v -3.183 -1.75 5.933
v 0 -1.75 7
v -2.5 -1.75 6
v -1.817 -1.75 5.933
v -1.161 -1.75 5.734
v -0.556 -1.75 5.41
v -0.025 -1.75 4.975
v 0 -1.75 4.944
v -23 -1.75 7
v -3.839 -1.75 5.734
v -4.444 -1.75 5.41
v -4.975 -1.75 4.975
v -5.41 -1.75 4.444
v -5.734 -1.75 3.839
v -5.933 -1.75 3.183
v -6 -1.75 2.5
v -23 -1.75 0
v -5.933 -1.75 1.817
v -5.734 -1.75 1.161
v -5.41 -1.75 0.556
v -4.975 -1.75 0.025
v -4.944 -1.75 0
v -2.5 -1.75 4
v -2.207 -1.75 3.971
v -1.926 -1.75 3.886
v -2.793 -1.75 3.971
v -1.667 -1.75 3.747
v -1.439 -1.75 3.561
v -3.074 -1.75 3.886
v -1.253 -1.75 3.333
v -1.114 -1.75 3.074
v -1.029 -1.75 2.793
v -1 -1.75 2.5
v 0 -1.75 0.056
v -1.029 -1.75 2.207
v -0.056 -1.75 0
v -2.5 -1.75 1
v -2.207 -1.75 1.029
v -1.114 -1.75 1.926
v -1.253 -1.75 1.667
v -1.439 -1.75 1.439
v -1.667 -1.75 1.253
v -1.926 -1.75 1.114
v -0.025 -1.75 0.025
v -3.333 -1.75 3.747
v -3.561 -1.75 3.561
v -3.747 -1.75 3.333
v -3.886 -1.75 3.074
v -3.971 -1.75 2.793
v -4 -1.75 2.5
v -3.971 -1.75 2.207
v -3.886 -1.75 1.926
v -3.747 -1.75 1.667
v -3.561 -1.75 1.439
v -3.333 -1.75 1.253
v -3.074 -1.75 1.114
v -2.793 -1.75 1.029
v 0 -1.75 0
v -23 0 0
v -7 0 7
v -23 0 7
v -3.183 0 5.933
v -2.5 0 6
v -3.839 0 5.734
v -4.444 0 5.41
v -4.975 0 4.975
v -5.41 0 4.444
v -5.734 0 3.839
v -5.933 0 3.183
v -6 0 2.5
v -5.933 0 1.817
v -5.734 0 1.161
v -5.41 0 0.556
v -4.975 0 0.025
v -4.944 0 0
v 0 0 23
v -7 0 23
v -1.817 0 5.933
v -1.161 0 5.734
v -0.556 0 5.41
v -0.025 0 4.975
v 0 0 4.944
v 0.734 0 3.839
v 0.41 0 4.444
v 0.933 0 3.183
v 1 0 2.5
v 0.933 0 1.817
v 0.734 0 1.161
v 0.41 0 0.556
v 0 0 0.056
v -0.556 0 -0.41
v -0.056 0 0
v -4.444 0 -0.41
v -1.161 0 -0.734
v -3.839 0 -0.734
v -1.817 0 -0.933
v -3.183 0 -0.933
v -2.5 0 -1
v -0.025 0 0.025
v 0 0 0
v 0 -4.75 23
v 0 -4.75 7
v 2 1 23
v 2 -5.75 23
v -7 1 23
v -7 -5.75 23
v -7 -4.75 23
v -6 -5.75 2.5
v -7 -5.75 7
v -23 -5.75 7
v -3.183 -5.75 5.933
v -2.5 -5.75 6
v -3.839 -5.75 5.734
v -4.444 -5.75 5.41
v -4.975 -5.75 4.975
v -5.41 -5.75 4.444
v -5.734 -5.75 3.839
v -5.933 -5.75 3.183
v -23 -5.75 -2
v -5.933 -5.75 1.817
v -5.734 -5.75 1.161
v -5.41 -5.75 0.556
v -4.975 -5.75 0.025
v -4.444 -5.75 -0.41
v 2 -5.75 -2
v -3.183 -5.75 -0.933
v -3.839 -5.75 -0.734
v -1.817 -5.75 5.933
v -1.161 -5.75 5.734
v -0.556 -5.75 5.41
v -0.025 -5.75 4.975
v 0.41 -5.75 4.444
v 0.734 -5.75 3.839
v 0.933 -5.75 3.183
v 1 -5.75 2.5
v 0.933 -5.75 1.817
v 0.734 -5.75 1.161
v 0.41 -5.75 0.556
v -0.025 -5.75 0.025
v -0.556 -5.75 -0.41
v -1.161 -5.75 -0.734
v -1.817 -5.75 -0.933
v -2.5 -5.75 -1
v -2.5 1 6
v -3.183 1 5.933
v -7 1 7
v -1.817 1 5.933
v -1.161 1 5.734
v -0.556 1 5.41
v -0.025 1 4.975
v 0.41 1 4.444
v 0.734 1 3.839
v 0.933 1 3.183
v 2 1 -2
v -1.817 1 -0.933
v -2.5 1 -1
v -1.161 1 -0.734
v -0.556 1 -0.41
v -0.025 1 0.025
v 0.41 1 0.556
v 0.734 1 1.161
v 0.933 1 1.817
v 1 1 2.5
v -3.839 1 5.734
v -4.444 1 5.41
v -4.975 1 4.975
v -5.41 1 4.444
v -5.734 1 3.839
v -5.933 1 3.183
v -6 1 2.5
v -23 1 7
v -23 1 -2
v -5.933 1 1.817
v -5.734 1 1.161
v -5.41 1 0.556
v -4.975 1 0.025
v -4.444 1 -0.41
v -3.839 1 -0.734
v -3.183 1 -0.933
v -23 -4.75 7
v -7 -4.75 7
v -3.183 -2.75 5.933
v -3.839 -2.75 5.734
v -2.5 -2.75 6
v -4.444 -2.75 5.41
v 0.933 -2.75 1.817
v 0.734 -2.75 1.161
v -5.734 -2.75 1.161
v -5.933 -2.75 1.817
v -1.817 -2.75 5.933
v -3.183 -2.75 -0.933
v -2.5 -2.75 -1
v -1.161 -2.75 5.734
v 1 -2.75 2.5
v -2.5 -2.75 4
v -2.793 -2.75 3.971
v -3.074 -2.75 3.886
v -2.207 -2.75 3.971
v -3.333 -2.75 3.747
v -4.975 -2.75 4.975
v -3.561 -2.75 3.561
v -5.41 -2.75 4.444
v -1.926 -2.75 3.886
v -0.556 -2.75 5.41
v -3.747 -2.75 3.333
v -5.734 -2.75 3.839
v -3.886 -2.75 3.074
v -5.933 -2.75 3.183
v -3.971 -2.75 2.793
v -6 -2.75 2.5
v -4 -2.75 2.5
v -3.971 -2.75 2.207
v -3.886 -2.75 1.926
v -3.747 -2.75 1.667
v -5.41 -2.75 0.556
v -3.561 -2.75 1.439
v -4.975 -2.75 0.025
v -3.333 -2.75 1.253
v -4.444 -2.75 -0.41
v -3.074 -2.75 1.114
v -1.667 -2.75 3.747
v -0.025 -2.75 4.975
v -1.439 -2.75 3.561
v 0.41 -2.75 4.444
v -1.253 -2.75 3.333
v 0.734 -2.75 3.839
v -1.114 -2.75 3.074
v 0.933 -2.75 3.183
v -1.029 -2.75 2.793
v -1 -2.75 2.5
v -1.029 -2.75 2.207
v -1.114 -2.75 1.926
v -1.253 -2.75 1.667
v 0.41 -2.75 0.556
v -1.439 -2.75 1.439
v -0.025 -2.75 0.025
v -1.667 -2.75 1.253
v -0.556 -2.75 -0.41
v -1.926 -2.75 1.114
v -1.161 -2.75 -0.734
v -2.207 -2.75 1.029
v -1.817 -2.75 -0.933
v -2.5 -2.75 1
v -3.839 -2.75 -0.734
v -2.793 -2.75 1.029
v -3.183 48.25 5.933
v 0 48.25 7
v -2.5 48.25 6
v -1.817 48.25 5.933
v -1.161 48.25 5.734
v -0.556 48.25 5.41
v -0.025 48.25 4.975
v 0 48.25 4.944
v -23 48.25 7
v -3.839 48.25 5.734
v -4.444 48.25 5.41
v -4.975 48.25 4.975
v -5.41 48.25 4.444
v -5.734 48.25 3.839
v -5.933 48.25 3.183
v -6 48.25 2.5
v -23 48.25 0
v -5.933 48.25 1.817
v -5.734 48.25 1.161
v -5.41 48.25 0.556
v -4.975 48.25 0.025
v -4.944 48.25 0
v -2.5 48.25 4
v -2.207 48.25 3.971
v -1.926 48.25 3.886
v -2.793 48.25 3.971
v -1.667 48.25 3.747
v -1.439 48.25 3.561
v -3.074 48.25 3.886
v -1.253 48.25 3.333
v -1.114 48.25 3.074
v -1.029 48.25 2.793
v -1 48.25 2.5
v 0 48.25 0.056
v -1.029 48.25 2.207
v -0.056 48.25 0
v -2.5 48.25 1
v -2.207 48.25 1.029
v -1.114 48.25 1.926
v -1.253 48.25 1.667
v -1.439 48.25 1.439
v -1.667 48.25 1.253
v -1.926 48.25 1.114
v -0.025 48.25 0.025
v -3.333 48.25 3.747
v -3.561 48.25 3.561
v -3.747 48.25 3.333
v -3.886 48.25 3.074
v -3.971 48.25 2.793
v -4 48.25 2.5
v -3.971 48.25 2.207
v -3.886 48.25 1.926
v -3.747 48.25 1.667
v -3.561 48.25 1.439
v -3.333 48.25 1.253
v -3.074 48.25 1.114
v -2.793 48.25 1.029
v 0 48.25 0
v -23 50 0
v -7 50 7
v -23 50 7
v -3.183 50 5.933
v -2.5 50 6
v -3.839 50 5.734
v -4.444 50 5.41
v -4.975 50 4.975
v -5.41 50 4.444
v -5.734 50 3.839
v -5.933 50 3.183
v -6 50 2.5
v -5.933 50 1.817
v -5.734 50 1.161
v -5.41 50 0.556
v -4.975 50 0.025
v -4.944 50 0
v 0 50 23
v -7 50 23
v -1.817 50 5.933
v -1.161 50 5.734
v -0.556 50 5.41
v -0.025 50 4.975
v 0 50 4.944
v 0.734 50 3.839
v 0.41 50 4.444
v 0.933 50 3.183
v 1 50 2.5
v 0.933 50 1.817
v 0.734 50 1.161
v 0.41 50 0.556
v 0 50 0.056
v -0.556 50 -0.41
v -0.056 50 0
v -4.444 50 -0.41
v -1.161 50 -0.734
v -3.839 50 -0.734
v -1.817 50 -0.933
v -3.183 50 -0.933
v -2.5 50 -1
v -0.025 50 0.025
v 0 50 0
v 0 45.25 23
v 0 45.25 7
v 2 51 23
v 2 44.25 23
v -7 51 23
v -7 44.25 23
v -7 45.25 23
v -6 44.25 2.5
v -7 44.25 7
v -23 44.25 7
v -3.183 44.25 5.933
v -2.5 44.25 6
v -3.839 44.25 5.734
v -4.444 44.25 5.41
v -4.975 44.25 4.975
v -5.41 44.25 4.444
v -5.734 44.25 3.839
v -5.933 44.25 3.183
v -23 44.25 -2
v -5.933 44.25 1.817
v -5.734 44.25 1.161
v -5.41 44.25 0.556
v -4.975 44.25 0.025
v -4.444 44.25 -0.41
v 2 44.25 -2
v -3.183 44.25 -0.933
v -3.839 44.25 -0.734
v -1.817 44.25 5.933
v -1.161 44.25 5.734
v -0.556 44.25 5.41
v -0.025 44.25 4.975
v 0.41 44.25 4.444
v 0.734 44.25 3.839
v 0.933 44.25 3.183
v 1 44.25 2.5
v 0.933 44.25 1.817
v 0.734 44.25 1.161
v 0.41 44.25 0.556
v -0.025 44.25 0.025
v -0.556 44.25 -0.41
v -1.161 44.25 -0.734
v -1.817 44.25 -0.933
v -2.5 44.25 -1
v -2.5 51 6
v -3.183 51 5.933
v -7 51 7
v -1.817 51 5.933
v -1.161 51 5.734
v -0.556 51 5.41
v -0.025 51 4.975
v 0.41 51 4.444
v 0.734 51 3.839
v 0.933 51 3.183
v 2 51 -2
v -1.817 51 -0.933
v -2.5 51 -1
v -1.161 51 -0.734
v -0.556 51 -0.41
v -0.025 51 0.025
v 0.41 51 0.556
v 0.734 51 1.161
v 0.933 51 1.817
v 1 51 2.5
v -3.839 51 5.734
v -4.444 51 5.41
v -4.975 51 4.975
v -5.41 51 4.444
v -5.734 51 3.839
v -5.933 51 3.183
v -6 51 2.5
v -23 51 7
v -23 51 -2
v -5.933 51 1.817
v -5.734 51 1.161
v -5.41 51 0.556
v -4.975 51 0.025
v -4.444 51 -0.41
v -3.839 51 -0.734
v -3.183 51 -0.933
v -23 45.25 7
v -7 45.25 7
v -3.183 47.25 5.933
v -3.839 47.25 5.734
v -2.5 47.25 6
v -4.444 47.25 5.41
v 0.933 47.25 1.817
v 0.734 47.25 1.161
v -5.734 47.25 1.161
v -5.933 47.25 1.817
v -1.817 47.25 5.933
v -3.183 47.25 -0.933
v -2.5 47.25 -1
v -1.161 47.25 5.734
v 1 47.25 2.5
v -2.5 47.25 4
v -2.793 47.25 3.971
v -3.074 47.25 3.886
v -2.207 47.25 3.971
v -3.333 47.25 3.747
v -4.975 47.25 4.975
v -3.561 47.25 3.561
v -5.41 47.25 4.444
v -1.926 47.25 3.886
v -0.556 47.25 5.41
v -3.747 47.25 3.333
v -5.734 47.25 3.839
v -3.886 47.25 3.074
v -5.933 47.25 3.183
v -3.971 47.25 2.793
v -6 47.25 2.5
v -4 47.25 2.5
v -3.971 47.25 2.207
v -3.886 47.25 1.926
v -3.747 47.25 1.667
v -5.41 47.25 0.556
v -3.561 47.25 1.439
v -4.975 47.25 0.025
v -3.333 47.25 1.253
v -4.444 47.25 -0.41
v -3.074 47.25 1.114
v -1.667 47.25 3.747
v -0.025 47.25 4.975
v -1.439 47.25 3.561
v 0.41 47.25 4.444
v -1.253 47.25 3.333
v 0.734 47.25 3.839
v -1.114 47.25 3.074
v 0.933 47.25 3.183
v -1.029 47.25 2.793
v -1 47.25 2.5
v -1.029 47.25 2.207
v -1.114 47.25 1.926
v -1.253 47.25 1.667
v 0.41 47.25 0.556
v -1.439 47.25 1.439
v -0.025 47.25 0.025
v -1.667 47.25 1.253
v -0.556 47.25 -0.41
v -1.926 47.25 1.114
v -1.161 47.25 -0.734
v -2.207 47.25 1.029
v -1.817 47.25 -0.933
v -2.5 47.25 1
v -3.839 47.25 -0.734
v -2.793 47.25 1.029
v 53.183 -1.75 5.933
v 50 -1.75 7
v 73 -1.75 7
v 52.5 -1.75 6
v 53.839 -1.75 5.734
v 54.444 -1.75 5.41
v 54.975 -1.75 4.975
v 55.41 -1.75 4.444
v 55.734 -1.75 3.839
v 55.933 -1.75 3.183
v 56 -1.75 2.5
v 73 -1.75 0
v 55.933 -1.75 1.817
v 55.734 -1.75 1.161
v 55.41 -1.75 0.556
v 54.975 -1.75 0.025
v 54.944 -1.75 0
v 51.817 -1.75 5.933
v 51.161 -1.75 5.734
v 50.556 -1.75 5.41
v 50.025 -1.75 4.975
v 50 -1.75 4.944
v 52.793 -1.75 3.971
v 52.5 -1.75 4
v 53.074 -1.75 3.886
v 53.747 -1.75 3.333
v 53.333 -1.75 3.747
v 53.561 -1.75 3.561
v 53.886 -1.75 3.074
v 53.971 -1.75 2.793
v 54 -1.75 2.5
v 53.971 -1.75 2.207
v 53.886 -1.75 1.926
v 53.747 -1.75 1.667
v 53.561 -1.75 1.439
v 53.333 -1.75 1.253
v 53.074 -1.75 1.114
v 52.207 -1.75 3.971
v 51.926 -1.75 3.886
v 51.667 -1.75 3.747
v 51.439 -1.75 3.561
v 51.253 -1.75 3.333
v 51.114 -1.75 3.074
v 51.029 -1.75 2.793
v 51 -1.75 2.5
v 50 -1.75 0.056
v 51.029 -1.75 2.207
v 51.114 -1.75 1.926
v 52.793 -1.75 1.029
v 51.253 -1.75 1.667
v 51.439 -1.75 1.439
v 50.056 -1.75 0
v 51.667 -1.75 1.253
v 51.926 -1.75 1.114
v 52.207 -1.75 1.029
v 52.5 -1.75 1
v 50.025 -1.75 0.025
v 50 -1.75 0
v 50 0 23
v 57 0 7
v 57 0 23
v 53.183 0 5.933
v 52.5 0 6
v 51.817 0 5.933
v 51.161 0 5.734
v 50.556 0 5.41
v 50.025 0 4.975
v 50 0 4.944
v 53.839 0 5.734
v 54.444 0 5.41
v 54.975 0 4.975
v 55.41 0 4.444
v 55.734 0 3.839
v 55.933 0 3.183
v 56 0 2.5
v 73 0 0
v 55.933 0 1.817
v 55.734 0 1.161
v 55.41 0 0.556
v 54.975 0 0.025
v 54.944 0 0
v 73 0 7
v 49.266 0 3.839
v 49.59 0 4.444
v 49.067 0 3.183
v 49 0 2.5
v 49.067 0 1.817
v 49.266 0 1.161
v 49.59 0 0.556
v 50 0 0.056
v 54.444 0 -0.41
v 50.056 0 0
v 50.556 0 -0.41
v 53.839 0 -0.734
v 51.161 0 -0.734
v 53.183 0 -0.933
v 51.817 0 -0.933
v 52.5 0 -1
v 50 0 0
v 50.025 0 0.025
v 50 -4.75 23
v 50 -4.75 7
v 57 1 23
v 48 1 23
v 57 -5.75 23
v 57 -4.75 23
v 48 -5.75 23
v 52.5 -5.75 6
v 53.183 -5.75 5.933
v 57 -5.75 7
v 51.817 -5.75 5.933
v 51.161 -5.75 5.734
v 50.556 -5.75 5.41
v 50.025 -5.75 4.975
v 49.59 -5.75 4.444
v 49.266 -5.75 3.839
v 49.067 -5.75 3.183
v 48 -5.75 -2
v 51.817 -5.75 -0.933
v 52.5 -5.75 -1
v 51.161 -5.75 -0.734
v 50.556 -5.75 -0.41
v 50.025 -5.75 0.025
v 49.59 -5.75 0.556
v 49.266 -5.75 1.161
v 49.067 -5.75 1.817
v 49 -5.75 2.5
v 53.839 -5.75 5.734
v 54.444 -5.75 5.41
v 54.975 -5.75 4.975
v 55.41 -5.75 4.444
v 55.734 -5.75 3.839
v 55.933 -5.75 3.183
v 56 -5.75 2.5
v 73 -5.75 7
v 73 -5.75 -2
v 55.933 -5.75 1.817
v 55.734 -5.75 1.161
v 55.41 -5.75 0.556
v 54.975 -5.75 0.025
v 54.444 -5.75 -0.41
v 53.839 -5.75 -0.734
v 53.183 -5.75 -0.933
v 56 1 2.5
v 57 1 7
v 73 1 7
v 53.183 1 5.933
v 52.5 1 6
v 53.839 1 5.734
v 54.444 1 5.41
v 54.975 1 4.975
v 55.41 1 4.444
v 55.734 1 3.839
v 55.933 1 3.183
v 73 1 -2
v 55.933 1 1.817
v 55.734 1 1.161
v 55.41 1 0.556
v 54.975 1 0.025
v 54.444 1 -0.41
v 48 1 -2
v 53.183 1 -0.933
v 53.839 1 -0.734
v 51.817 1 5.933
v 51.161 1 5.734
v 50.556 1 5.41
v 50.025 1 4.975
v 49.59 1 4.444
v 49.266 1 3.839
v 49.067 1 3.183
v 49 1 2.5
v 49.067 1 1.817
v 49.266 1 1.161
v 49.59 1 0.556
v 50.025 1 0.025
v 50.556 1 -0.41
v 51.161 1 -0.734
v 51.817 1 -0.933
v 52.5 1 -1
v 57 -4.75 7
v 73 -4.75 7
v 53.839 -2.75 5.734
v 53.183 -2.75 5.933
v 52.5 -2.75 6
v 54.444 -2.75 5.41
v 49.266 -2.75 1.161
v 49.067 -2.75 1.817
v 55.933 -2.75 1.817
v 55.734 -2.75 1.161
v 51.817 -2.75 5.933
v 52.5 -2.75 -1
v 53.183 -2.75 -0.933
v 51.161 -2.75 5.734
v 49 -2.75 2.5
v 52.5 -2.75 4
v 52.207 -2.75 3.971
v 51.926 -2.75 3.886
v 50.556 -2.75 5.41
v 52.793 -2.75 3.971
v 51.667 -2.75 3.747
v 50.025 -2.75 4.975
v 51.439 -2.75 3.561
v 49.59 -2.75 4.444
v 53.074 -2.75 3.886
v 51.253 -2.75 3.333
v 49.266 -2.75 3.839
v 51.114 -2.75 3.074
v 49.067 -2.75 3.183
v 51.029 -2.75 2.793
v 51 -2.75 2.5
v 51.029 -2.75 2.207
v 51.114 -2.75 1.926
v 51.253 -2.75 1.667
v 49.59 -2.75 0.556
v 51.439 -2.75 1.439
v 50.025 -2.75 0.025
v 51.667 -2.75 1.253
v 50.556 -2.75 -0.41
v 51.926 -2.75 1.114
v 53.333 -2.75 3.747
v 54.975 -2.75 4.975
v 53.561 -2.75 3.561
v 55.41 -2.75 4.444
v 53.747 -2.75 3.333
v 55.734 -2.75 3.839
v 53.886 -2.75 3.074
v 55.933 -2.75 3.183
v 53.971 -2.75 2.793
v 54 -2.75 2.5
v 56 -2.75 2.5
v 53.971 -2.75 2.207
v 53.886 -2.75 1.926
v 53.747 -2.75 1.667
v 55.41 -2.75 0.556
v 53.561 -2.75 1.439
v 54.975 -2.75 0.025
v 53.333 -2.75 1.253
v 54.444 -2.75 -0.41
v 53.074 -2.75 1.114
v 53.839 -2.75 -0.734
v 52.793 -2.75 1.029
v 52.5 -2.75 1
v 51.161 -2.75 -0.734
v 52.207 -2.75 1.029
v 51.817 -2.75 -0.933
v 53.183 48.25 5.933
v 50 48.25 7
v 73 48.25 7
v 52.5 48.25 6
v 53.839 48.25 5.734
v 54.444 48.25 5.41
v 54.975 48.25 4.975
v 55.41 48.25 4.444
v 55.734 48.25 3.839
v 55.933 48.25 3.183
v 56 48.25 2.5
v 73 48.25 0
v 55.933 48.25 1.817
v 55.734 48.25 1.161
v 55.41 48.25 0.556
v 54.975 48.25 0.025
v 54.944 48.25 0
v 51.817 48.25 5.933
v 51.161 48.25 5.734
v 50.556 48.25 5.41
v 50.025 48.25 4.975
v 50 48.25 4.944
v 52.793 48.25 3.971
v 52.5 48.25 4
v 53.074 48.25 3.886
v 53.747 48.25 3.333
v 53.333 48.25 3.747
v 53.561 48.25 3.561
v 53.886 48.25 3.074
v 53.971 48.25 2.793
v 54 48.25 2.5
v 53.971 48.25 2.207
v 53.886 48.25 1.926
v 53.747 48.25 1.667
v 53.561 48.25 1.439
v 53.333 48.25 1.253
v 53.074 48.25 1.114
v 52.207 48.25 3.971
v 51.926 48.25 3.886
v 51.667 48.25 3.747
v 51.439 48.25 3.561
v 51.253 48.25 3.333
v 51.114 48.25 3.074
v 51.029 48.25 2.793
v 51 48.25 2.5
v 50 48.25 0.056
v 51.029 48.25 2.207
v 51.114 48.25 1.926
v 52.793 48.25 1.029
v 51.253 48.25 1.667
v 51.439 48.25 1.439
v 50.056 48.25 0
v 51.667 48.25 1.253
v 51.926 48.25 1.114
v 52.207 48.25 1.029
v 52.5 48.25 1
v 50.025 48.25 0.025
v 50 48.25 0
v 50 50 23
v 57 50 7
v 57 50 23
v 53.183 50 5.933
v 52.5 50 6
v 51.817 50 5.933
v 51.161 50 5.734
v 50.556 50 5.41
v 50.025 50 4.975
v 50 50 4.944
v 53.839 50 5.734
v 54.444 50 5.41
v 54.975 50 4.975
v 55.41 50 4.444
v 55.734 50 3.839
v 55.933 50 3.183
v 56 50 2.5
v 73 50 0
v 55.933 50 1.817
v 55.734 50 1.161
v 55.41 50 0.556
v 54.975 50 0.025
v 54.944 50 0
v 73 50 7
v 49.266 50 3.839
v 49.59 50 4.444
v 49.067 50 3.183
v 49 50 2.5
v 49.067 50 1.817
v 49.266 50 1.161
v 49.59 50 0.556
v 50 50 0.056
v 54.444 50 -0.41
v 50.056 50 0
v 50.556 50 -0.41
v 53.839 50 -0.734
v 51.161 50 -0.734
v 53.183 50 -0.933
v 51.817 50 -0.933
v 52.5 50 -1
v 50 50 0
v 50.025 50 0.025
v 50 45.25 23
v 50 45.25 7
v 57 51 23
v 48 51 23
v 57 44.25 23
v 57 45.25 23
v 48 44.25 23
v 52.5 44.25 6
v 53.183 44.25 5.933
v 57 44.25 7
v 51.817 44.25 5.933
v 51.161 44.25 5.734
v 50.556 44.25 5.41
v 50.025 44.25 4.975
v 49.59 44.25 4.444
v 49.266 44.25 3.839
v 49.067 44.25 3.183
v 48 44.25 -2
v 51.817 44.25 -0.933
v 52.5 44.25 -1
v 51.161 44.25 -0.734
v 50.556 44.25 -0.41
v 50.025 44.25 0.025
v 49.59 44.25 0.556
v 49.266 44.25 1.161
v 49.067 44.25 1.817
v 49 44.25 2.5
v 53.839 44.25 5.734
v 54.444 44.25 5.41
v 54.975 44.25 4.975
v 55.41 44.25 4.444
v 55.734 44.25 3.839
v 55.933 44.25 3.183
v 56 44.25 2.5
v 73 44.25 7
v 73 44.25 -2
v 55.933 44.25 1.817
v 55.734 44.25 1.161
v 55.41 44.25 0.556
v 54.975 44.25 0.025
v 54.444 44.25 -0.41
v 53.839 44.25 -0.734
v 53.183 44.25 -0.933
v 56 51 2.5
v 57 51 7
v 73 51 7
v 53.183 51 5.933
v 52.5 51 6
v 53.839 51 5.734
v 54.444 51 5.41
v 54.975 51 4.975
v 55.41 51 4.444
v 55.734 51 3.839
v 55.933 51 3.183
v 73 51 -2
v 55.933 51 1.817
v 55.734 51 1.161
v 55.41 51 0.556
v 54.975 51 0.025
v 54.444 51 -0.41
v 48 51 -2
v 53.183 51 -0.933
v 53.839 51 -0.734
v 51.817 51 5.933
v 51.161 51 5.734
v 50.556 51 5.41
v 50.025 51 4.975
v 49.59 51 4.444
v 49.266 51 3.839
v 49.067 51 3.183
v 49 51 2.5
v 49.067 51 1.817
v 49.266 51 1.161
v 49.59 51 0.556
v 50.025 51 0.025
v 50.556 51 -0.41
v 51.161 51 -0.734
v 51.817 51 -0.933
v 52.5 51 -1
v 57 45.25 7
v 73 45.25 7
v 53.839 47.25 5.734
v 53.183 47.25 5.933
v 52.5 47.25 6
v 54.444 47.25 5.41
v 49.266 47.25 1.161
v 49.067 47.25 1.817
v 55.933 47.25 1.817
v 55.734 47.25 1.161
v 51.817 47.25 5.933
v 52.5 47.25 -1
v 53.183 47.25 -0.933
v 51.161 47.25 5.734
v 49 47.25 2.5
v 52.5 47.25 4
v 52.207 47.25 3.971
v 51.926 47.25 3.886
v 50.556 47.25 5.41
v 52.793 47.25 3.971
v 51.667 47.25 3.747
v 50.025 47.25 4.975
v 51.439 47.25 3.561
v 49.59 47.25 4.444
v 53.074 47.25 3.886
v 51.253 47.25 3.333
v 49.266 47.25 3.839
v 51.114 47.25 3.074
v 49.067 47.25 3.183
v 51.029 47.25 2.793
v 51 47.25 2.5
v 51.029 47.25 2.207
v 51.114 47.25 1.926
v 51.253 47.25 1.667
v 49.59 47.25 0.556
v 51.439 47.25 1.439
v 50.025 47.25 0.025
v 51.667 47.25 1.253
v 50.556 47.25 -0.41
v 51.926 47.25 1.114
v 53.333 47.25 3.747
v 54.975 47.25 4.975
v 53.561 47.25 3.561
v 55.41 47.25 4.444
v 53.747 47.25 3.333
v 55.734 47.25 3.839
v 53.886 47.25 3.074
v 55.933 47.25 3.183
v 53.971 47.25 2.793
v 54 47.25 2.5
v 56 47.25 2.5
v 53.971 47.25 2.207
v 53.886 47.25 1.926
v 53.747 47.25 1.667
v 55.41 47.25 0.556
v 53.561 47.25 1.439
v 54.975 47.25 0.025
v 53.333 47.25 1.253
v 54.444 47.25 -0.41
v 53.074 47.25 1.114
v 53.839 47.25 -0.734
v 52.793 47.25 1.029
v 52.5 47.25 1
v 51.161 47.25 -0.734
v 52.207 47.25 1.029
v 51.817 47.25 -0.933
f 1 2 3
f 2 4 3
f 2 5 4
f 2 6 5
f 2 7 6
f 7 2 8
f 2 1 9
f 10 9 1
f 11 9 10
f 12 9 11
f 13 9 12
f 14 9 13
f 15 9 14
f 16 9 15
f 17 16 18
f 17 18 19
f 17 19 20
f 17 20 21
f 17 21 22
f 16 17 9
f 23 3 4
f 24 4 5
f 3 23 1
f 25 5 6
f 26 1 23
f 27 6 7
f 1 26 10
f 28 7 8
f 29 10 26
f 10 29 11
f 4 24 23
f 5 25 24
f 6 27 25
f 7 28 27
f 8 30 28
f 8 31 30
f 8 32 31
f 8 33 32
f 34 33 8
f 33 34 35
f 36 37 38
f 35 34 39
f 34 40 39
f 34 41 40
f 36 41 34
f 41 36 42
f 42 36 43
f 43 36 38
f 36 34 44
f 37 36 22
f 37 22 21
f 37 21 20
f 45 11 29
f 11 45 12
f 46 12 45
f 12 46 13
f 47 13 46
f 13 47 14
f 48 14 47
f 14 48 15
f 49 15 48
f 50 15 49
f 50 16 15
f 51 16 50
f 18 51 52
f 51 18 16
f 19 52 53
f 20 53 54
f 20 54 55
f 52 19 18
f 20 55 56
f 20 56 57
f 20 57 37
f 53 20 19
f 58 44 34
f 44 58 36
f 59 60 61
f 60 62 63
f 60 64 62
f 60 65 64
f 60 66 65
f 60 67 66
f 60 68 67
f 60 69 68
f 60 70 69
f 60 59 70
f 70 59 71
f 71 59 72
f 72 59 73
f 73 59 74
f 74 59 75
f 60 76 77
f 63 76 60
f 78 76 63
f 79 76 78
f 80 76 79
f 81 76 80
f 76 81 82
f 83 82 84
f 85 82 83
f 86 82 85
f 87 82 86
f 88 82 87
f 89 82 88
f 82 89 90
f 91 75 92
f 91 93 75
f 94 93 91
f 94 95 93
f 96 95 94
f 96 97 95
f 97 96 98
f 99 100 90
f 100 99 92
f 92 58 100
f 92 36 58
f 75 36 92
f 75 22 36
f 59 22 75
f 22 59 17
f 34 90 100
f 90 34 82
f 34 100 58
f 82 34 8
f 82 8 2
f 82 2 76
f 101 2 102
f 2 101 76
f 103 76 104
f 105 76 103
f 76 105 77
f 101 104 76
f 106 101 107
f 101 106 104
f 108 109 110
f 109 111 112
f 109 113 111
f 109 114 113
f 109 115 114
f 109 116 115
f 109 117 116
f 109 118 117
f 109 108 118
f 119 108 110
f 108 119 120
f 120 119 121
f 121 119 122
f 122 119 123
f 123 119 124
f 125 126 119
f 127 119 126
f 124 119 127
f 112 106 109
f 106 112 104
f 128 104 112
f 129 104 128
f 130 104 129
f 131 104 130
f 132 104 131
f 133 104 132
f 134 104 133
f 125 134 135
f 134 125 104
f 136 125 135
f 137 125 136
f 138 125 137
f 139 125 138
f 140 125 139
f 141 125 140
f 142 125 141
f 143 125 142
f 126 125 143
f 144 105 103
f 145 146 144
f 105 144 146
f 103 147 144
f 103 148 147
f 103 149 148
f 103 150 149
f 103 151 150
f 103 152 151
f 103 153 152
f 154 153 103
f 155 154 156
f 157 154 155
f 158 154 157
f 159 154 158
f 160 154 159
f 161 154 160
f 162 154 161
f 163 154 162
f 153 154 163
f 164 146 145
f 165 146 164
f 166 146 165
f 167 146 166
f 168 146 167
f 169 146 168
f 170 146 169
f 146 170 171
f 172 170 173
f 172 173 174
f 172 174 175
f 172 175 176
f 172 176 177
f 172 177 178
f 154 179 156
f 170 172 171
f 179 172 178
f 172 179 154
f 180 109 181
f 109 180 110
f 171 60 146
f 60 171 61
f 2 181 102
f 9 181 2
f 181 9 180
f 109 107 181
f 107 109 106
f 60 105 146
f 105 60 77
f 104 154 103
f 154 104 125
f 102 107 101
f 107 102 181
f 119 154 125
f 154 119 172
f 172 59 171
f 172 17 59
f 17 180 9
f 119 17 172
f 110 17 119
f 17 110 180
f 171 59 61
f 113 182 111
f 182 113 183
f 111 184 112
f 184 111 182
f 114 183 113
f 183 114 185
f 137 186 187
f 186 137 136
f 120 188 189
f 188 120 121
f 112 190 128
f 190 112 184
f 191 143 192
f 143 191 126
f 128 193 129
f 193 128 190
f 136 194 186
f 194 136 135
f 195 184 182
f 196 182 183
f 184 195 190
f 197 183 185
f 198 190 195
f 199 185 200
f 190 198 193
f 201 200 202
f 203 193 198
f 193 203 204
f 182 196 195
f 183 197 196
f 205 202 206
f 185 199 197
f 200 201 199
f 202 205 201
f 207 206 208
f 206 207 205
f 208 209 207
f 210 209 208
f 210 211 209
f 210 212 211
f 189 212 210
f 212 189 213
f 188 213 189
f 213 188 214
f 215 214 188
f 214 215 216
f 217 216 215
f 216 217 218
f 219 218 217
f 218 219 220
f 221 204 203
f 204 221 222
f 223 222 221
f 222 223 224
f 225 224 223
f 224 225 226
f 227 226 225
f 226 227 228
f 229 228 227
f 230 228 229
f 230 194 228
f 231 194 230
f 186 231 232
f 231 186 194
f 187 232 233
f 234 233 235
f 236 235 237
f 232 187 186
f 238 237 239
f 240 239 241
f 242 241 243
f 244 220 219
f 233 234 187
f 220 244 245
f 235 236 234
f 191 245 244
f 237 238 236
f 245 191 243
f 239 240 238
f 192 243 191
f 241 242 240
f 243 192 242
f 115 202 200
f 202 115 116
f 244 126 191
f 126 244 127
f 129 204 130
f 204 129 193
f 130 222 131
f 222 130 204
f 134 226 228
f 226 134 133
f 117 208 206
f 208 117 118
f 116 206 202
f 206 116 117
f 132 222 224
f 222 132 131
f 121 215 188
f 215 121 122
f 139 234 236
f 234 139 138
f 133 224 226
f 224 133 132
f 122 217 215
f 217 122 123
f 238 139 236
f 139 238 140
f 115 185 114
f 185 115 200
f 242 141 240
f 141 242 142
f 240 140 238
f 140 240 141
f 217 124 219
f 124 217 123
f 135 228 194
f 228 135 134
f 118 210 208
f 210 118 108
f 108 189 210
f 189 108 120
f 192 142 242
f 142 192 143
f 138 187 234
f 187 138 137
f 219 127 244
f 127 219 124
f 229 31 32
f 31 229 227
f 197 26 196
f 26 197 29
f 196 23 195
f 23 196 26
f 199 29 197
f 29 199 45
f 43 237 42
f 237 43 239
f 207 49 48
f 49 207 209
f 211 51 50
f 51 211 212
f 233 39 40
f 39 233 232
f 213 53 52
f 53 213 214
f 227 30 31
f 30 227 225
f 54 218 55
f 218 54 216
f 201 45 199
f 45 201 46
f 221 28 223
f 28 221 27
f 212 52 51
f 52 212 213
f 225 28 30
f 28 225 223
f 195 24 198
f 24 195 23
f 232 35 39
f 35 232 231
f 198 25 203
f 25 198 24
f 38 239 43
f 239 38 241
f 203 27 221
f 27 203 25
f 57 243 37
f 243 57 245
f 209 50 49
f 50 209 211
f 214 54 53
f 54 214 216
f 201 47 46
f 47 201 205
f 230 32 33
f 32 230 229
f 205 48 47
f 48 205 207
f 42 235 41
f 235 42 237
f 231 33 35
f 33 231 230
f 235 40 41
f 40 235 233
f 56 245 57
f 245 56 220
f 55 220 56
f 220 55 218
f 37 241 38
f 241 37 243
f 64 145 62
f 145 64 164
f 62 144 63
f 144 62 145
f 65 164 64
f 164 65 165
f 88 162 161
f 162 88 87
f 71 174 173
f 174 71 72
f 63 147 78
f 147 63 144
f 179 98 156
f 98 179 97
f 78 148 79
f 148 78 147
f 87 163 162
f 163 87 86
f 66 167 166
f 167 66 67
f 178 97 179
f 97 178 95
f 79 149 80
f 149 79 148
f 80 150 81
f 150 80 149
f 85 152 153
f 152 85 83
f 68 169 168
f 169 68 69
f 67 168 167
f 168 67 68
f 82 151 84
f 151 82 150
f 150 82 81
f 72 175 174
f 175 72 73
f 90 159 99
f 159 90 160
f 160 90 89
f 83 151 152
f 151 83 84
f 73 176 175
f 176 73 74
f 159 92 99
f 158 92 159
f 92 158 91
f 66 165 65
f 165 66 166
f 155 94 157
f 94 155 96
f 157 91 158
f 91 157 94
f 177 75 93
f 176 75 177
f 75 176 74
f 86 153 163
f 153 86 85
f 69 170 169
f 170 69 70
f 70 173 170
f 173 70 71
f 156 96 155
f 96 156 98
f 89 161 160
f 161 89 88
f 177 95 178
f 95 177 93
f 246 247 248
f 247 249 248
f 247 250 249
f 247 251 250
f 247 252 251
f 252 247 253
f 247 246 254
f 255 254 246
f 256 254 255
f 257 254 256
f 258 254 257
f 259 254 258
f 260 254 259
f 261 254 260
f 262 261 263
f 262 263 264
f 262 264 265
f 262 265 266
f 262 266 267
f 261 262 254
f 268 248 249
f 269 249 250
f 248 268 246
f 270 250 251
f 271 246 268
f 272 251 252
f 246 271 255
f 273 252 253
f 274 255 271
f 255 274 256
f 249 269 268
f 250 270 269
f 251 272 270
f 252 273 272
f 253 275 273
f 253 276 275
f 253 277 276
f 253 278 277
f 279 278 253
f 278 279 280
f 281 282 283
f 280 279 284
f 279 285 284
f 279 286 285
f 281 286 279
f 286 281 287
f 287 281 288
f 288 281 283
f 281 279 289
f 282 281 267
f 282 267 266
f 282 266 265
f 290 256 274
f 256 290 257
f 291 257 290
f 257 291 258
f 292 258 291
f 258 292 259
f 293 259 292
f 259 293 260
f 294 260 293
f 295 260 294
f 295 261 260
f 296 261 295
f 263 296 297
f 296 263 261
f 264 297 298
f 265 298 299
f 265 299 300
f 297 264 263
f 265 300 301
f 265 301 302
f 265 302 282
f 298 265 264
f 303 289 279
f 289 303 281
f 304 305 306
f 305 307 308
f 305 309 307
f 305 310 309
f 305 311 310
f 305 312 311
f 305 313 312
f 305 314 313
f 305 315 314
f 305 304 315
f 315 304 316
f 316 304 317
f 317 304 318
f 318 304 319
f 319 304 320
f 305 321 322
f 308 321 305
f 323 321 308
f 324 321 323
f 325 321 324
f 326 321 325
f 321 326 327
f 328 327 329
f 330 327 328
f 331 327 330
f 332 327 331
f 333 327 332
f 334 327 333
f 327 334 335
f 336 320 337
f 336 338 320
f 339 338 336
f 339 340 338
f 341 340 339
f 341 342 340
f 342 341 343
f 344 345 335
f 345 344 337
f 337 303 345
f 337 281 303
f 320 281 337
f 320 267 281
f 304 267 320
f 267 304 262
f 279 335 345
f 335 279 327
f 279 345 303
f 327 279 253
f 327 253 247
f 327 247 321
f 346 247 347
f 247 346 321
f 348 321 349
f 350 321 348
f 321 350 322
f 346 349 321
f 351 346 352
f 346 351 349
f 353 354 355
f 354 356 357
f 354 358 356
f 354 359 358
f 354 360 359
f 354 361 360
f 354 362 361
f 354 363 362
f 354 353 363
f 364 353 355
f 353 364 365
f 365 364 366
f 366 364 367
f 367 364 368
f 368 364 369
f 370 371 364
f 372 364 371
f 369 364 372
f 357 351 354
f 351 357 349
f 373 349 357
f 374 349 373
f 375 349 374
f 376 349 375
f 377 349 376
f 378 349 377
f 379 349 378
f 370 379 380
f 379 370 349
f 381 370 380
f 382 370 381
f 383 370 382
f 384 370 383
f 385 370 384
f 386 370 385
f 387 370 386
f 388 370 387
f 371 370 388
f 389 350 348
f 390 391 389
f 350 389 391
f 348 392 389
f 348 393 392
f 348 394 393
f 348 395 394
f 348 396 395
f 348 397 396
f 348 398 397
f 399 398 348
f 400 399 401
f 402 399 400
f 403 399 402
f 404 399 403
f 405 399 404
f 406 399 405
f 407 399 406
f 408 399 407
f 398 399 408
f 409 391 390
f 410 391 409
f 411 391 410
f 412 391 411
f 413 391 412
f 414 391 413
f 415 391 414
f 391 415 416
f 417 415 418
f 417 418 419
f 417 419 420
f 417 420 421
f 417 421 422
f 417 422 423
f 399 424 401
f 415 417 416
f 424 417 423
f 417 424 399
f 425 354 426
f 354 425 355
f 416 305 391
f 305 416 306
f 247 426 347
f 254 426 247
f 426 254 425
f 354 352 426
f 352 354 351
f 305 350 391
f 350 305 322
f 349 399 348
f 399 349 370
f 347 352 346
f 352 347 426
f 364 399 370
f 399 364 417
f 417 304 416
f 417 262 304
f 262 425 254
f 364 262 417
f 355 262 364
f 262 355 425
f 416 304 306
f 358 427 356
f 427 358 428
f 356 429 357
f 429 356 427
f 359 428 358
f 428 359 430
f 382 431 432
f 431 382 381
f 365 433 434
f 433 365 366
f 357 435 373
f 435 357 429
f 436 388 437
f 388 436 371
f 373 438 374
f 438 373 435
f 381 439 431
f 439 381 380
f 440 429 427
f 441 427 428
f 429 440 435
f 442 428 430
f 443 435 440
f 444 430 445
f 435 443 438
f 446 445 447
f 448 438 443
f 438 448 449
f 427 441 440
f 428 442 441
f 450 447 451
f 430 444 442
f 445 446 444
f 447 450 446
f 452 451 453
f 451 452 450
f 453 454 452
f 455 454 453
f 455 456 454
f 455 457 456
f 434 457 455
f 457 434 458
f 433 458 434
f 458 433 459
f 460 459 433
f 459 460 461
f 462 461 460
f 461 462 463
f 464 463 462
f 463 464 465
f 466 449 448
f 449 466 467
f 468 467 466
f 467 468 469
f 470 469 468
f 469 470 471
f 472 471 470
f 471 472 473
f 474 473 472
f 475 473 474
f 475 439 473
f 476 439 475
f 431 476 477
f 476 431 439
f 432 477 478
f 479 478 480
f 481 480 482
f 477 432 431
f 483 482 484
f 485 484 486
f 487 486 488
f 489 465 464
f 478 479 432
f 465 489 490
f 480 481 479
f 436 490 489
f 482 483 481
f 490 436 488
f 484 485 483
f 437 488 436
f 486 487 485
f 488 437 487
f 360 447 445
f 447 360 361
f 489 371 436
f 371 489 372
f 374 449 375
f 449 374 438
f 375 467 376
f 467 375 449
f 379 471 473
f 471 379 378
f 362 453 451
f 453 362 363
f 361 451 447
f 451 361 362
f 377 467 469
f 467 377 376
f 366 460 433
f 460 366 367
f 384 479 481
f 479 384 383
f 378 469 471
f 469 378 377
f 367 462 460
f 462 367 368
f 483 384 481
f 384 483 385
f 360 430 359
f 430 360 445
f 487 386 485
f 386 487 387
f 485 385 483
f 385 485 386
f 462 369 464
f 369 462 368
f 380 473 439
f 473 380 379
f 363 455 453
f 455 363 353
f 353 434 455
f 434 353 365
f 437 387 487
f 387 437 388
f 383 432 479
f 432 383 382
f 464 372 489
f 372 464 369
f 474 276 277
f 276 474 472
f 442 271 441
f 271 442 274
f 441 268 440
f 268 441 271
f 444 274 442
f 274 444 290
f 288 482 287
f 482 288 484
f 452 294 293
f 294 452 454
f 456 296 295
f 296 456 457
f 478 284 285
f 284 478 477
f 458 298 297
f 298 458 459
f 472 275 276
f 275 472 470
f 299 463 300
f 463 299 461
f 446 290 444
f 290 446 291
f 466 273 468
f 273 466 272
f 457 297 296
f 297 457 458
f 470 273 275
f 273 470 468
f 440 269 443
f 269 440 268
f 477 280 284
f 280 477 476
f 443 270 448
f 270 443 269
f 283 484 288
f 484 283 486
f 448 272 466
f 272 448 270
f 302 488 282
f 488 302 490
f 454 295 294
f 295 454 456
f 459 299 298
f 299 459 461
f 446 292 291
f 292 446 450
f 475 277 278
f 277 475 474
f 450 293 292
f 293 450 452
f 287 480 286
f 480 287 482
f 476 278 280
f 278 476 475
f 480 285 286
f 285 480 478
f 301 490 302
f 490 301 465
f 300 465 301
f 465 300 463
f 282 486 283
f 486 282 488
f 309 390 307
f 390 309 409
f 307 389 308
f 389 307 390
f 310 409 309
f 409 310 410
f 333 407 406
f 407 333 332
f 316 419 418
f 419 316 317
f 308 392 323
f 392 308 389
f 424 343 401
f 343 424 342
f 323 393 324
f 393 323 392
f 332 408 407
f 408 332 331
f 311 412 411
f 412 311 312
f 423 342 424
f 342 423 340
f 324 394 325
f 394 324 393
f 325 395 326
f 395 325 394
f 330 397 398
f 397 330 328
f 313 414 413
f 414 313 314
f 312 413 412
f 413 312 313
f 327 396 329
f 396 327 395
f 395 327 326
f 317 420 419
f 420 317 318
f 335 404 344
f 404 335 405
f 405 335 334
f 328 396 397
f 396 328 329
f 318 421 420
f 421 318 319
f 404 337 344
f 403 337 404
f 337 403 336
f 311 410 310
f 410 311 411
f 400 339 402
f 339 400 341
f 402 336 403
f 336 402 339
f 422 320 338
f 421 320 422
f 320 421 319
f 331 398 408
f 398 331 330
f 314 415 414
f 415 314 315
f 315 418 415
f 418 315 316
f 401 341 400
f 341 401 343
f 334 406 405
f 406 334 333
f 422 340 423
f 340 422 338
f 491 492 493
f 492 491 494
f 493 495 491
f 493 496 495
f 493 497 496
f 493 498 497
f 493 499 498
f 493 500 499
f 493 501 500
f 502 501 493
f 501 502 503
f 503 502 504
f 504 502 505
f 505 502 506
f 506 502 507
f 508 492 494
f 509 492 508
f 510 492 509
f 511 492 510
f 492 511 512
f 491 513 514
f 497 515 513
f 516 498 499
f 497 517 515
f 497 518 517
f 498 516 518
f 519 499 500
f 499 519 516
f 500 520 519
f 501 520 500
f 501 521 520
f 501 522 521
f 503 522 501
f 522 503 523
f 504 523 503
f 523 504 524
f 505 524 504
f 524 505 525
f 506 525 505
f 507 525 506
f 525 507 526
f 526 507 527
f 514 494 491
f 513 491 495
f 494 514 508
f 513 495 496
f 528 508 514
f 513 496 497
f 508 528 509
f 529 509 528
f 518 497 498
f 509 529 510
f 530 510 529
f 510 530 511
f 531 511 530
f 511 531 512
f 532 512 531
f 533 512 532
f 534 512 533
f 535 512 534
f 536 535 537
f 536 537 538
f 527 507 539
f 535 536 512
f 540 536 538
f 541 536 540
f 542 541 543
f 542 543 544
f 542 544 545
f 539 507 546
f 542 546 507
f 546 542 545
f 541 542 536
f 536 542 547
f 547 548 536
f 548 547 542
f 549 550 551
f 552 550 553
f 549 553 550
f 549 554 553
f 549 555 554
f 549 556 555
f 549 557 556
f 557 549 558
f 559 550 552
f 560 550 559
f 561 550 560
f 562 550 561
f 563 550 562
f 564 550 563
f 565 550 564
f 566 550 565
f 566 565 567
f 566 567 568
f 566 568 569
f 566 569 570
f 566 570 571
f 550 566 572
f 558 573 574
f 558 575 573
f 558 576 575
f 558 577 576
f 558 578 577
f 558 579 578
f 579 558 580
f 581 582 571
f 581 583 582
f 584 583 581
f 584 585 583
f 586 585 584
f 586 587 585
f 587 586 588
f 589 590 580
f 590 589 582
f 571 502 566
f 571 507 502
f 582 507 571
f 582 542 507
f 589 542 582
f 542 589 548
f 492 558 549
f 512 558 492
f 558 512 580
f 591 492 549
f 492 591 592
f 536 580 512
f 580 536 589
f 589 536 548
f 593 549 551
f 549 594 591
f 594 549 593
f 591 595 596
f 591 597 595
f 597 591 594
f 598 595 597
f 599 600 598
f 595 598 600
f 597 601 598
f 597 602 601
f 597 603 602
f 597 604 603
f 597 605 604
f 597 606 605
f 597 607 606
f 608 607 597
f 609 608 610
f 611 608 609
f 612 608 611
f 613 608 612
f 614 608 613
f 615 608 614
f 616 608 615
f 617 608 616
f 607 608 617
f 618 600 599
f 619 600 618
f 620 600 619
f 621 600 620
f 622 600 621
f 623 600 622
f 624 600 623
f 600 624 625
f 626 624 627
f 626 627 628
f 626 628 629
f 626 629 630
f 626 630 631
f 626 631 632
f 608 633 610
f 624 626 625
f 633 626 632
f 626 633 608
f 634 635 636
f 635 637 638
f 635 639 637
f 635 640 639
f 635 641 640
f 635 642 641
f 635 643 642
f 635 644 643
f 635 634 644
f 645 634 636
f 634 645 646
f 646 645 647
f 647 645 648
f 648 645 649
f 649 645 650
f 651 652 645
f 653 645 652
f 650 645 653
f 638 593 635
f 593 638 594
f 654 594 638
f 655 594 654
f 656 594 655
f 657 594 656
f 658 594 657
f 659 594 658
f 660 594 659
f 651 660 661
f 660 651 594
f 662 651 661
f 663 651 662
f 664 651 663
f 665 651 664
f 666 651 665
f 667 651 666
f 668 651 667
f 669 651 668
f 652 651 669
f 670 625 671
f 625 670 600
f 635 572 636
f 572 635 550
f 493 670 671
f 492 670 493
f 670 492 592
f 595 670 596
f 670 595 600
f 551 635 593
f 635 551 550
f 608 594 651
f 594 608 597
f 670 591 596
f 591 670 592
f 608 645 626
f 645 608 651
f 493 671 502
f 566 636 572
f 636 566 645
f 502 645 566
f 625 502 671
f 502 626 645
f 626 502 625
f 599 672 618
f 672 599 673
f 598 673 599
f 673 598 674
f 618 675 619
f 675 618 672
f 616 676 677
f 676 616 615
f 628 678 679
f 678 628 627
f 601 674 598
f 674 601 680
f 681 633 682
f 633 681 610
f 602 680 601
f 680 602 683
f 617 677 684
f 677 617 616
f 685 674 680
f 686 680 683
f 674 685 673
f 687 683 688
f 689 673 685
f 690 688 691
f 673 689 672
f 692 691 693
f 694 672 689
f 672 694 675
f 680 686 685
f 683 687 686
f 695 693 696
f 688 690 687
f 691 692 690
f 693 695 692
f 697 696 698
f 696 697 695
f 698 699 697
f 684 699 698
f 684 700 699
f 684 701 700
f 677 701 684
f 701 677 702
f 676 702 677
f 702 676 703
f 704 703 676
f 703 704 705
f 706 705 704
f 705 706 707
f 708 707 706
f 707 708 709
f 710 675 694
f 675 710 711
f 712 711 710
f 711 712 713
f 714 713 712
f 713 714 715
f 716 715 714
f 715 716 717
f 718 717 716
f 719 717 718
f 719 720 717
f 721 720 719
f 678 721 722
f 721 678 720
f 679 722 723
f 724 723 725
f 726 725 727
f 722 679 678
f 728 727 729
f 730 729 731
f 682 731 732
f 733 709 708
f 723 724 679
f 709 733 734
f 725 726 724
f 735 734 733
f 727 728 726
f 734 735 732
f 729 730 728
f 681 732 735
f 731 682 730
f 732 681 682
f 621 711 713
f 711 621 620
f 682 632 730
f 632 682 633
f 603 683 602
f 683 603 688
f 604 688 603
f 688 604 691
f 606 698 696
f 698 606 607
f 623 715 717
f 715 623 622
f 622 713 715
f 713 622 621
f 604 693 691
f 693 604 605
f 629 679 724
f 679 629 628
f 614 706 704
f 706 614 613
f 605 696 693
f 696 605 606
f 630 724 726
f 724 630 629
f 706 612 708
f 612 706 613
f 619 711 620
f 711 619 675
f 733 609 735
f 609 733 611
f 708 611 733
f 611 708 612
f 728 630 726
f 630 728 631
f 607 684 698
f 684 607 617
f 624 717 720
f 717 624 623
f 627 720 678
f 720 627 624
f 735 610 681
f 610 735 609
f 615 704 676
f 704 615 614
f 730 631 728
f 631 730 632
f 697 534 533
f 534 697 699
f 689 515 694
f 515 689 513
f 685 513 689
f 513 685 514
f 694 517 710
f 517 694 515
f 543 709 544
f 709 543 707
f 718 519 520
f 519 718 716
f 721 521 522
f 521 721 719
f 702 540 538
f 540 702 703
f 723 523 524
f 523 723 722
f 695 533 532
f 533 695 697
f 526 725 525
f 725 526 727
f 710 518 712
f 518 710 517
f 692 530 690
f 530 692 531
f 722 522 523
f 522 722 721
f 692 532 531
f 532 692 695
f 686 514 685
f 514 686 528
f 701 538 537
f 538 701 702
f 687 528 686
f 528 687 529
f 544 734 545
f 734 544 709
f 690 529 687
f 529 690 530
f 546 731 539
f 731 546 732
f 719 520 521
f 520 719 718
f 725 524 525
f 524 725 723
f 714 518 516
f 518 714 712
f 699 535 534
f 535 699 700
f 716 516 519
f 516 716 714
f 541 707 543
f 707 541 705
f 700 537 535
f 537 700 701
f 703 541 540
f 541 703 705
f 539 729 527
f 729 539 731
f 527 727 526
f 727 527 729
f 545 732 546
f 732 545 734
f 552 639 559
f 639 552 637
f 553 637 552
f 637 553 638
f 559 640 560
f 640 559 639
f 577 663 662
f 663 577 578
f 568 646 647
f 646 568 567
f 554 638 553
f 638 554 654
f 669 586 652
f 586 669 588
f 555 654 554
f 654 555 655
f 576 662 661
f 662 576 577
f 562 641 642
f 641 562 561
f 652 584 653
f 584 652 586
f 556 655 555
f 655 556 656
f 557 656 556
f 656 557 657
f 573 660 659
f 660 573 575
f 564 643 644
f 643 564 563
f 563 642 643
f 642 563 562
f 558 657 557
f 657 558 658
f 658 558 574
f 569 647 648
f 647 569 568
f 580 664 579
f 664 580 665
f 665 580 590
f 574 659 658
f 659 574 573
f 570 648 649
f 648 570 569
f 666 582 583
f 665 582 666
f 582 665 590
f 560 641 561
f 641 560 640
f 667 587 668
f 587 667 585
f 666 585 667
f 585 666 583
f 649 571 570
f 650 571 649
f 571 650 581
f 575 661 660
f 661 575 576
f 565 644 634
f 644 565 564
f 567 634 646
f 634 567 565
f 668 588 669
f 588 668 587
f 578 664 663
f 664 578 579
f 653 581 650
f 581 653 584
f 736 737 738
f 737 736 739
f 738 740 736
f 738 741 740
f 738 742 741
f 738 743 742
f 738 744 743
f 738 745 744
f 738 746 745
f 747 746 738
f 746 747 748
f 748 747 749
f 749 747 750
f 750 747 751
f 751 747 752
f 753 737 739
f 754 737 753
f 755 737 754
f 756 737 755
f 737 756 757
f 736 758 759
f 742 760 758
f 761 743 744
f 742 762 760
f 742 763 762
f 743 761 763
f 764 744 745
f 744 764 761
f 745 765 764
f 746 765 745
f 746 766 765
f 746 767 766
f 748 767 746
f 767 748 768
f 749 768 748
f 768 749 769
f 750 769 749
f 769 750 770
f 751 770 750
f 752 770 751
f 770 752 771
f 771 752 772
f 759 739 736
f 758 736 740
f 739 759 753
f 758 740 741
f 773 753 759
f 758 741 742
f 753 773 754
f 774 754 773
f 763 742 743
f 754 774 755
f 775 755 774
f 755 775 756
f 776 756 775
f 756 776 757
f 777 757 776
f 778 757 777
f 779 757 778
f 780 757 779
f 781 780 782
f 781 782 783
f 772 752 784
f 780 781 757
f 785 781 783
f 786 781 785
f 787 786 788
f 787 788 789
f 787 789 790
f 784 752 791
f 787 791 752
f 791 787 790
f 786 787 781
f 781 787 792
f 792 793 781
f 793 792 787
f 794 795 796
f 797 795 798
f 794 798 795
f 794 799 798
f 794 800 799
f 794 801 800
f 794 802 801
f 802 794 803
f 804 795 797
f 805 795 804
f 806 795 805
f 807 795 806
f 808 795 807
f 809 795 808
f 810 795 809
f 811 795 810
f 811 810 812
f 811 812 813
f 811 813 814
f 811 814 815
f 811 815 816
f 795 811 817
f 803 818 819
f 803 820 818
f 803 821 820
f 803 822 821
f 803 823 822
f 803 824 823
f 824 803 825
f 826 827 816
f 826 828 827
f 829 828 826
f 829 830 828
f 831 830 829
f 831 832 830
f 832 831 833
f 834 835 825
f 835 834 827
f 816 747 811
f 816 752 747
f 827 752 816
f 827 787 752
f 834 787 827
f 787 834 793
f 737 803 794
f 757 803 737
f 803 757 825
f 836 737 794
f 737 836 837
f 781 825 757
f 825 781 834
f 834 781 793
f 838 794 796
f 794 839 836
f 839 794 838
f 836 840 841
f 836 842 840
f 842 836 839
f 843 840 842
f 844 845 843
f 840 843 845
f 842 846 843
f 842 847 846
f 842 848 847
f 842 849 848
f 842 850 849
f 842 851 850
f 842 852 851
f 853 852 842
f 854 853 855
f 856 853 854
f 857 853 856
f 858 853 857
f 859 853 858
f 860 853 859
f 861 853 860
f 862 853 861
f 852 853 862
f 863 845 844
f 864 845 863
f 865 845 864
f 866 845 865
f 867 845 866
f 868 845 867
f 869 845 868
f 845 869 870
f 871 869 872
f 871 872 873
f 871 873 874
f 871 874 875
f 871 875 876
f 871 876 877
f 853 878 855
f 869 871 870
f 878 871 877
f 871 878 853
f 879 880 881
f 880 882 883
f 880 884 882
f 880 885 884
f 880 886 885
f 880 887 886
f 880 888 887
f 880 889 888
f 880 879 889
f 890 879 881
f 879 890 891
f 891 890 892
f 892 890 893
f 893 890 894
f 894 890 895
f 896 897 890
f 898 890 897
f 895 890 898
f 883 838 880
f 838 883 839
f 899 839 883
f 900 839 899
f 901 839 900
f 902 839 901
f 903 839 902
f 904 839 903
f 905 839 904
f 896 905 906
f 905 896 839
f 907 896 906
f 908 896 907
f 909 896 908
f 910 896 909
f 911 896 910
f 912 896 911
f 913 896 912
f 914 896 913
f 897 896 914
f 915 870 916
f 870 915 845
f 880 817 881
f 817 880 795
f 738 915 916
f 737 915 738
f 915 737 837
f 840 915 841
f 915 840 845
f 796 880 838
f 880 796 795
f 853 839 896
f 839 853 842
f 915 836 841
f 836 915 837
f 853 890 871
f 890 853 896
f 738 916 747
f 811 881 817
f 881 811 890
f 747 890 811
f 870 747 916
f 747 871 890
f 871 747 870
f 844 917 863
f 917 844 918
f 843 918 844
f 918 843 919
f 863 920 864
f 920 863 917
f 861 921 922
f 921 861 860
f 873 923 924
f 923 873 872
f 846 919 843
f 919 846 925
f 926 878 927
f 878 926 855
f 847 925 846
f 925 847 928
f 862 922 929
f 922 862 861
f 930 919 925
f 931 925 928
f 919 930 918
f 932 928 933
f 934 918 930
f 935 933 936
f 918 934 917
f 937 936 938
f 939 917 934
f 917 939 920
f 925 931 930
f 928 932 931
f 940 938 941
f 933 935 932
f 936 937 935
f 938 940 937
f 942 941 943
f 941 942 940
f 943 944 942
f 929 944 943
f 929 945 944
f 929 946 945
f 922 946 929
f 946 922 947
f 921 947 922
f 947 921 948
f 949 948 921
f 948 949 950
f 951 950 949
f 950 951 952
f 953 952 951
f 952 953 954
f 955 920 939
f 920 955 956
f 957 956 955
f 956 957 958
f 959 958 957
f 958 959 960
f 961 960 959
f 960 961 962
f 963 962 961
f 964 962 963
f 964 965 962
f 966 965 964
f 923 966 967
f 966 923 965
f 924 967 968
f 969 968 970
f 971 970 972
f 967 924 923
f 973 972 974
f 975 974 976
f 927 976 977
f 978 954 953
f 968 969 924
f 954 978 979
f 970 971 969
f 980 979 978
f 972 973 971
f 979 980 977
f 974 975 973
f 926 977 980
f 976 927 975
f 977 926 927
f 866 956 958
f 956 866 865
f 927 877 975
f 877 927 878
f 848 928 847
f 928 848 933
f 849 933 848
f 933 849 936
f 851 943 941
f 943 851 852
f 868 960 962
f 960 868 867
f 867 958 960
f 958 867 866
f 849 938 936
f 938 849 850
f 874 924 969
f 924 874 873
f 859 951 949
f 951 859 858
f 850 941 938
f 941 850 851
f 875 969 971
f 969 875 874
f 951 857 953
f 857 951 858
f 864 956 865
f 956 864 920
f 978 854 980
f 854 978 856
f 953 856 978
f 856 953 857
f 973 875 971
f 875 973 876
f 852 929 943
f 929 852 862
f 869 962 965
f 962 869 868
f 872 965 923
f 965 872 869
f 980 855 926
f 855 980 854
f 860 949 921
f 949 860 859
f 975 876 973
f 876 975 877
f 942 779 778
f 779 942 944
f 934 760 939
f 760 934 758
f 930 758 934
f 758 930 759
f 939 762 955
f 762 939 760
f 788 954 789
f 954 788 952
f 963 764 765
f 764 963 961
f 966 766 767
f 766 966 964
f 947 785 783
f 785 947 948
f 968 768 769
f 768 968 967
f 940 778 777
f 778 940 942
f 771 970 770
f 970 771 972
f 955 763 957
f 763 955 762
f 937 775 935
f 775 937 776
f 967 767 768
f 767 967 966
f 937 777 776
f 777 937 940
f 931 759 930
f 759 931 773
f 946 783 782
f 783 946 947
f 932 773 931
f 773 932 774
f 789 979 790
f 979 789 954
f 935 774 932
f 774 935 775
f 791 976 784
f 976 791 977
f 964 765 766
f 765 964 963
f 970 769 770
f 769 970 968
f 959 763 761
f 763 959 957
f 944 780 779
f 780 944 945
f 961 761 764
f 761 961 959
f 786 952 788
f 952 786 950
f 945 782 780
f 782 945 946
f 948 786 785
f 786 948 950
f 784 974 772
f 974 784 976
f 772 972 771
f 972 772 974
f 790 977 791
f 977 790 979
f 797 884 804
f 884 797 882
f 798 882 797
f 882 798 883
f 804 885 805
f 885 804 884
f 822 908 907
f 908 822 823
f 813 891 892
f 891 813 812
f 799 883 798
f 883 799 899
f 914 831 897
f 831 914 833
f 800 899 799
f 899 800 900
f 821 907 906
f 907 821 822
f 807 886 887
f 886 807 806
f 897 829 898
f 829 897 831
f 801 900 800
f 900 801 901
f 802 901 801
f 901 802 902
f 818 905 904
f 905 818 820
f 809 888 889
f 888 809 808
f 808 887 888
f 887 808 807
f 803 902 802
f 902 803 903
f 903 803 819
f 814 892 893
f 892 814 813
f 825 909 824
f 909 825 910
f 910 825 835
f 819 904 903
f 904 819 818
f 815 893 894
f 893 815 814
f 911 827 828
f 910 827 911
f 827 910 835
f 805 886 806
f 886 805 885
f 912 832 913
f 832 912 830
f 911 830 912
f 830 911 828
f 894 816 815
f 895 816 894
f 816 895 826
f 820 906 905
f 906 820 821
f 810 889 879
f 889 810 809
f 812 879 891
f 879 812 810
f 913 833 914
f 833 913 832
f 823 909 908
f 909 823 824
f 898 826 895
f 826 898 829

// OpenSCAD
/**
 * Author: Luis Chardon <luischardon@gmail.com>
 * Description: Prusa i3 Heated Bed Glass Holder
 * Date Modified: 8/13/2016
 */

/* [Heated Bed Properties] */
// Heated Bed PCB Board Thickness
BedThickness = 1.75; // [1:0.01:3]

/* [Glass Bed Properties] */
// Thickness of your glass bed
GlassThickness = 3; // [1:0.1:5]
// Width of your glass bed
GlassWidth = 200; // [180:200]
// Height of your glass bed
GlassHeight = 214; // [200:214]

/* [Clip Properties] */
// Top and bottom clip thickness
ClipThickness = 1; // [0.5:0.1:3]
// How long the clip extends to cover the top of the glass bed
ClipWidth = 7; // [1:15]
// How long the clip extends along the perimeter of the bed
ClipLength = 16; // [5:50]
// Clip outer wall width
ClipOuterWallWidth = 2; // [1:5]

/* [Bed Preview] */
// Preview clips on the bed and glass
ShowPreview = "false"; // [false,true]

/* [Hidden] */
$fn=32;
BedWidthAndHeight = 214;
Hole = 20;
TotalHeight = ClipThickness + BedThickness + GlassThickness + ClipThickness;
SpacerWidth = (BedWidthAndHeight - GlassWidth) / 2; 

module HoleLL()
{
    translate([2.5, 2.5, -Hole / 2]) cylinder(d = 3, h = Hole);
};
module HoleLR()
{
    translate([BedWidthAndHeight - 2.5, 2.5, -Hole / 2]) cylinder(d = 3, h = Hole);
};
module HoleTL()
{
    translate([2.5, BedWidthAndHeight - 2.5, -Hole / 2]) cylinder(d = 3, h = Hole);
};
module HoleTR()
{
    translate([BedWidthAndHeight - 2.5, BedWidthAndHeight - 2.5, -Hole / 2]) cylinder (d = 3, h = Hole);
};

module HeatedBed()
{
    difference(){
        color("red") cube([BedWidthAndHeight, BedWidthAndHeight, BedThickness]);
        HoleLL();
        HoleLR();
        HoleTL();
        HoleTR();
    }
}

module Glass()
{
    translate([SpacerWidth, (BedWidthAndHeight - GlassHeight) / 2, BedThickness]) color([1, 1, 1, 0.5]) cube([GlassWidth, GlassHeight, GlassThickness]);
}

module Holder()
{
    color("blue")
    {
        // Right clip
        difference()
        {
            translate([SpacerWidth, -ClipOuterWallWidth, -ClipThickness]) cube([ClipLength, ClipOuterWallWidth + ClipWidth, TotalHeight]);
            HeatedBed();
            Glass();
        }

        // Top Clip
        difference()
        {
            translate([-ClipOuterWallWidth, SpacerWidth, -ClipThickness]) cube([ClipOuterWallWidth + SpacerWidth, ClipLength, TotalHeight]);
            HeatedBed();
            Glass();
        }

        // Screw Spacer
        difference()
        {
            translate([2.5, 2.5, BedThickness]) cylinder(d = 7, h = 1);
            HoleLL();
        }
        
        // Screw Hole
        difference()
        {
            translate([-ClipOuterWallWidth, -ClipOuterWallWidth, -ClipThickness]) cube([SpacerWidth + ClipOuterWallWidth, SpacerWidth + ClipOuterWallWidth, TotalHeight]);
            // Screw body hole
            HoleLL();
            // Screw head hole
            translate([2.5, 2.5, BedThickness]) cylinder(d = 7, h = GlassThickness + ClipThickness + 0.1);
            // Spring bottom hole
            translate([2.5, 2.5, -ClipThickness - 0.1]) cylinder(d = 7, h = ClipThickness + 0.1);
            HeatedBed();
            Glass();
        }
        
    }
}

module Preview()
{
    Holder();
    translate([BedWidthAndHeight, BedWidthAndHeight, 0]) rotate(a=[0, 0, 180]) Holder();
    translate([BedWidthAndHeight, 0, 0]) mirror([1,0,0]) Holder();
    translate([0, BedWidthAndHeight, 0]) mirror([1,0,0]) rotate(a=[0, 0, 180]) Holder();
    HeatedBed();
    Glass();
}

module Print()
{
    spacex = 50;
    spacey = 50;
    rotation = 270;
    rotate(a=[0, rotation, 90]) Holder();
    translate([0, spacey, 0]) rotate(a=[0, rotation, 90]) Holder();
    translate([spacex, 0, 0]) mirror([1, 0, 0]) rotate(a=[0, rotation, 90]) Holder();
    translate([spacex, spacey, 0]) mirror([1, 0, 0]) rotate(a=[0, rotation, 90]) Holder();
}

if(ShowPreview == "true")
{
    Preview();
}
else
{
    Print();
}
